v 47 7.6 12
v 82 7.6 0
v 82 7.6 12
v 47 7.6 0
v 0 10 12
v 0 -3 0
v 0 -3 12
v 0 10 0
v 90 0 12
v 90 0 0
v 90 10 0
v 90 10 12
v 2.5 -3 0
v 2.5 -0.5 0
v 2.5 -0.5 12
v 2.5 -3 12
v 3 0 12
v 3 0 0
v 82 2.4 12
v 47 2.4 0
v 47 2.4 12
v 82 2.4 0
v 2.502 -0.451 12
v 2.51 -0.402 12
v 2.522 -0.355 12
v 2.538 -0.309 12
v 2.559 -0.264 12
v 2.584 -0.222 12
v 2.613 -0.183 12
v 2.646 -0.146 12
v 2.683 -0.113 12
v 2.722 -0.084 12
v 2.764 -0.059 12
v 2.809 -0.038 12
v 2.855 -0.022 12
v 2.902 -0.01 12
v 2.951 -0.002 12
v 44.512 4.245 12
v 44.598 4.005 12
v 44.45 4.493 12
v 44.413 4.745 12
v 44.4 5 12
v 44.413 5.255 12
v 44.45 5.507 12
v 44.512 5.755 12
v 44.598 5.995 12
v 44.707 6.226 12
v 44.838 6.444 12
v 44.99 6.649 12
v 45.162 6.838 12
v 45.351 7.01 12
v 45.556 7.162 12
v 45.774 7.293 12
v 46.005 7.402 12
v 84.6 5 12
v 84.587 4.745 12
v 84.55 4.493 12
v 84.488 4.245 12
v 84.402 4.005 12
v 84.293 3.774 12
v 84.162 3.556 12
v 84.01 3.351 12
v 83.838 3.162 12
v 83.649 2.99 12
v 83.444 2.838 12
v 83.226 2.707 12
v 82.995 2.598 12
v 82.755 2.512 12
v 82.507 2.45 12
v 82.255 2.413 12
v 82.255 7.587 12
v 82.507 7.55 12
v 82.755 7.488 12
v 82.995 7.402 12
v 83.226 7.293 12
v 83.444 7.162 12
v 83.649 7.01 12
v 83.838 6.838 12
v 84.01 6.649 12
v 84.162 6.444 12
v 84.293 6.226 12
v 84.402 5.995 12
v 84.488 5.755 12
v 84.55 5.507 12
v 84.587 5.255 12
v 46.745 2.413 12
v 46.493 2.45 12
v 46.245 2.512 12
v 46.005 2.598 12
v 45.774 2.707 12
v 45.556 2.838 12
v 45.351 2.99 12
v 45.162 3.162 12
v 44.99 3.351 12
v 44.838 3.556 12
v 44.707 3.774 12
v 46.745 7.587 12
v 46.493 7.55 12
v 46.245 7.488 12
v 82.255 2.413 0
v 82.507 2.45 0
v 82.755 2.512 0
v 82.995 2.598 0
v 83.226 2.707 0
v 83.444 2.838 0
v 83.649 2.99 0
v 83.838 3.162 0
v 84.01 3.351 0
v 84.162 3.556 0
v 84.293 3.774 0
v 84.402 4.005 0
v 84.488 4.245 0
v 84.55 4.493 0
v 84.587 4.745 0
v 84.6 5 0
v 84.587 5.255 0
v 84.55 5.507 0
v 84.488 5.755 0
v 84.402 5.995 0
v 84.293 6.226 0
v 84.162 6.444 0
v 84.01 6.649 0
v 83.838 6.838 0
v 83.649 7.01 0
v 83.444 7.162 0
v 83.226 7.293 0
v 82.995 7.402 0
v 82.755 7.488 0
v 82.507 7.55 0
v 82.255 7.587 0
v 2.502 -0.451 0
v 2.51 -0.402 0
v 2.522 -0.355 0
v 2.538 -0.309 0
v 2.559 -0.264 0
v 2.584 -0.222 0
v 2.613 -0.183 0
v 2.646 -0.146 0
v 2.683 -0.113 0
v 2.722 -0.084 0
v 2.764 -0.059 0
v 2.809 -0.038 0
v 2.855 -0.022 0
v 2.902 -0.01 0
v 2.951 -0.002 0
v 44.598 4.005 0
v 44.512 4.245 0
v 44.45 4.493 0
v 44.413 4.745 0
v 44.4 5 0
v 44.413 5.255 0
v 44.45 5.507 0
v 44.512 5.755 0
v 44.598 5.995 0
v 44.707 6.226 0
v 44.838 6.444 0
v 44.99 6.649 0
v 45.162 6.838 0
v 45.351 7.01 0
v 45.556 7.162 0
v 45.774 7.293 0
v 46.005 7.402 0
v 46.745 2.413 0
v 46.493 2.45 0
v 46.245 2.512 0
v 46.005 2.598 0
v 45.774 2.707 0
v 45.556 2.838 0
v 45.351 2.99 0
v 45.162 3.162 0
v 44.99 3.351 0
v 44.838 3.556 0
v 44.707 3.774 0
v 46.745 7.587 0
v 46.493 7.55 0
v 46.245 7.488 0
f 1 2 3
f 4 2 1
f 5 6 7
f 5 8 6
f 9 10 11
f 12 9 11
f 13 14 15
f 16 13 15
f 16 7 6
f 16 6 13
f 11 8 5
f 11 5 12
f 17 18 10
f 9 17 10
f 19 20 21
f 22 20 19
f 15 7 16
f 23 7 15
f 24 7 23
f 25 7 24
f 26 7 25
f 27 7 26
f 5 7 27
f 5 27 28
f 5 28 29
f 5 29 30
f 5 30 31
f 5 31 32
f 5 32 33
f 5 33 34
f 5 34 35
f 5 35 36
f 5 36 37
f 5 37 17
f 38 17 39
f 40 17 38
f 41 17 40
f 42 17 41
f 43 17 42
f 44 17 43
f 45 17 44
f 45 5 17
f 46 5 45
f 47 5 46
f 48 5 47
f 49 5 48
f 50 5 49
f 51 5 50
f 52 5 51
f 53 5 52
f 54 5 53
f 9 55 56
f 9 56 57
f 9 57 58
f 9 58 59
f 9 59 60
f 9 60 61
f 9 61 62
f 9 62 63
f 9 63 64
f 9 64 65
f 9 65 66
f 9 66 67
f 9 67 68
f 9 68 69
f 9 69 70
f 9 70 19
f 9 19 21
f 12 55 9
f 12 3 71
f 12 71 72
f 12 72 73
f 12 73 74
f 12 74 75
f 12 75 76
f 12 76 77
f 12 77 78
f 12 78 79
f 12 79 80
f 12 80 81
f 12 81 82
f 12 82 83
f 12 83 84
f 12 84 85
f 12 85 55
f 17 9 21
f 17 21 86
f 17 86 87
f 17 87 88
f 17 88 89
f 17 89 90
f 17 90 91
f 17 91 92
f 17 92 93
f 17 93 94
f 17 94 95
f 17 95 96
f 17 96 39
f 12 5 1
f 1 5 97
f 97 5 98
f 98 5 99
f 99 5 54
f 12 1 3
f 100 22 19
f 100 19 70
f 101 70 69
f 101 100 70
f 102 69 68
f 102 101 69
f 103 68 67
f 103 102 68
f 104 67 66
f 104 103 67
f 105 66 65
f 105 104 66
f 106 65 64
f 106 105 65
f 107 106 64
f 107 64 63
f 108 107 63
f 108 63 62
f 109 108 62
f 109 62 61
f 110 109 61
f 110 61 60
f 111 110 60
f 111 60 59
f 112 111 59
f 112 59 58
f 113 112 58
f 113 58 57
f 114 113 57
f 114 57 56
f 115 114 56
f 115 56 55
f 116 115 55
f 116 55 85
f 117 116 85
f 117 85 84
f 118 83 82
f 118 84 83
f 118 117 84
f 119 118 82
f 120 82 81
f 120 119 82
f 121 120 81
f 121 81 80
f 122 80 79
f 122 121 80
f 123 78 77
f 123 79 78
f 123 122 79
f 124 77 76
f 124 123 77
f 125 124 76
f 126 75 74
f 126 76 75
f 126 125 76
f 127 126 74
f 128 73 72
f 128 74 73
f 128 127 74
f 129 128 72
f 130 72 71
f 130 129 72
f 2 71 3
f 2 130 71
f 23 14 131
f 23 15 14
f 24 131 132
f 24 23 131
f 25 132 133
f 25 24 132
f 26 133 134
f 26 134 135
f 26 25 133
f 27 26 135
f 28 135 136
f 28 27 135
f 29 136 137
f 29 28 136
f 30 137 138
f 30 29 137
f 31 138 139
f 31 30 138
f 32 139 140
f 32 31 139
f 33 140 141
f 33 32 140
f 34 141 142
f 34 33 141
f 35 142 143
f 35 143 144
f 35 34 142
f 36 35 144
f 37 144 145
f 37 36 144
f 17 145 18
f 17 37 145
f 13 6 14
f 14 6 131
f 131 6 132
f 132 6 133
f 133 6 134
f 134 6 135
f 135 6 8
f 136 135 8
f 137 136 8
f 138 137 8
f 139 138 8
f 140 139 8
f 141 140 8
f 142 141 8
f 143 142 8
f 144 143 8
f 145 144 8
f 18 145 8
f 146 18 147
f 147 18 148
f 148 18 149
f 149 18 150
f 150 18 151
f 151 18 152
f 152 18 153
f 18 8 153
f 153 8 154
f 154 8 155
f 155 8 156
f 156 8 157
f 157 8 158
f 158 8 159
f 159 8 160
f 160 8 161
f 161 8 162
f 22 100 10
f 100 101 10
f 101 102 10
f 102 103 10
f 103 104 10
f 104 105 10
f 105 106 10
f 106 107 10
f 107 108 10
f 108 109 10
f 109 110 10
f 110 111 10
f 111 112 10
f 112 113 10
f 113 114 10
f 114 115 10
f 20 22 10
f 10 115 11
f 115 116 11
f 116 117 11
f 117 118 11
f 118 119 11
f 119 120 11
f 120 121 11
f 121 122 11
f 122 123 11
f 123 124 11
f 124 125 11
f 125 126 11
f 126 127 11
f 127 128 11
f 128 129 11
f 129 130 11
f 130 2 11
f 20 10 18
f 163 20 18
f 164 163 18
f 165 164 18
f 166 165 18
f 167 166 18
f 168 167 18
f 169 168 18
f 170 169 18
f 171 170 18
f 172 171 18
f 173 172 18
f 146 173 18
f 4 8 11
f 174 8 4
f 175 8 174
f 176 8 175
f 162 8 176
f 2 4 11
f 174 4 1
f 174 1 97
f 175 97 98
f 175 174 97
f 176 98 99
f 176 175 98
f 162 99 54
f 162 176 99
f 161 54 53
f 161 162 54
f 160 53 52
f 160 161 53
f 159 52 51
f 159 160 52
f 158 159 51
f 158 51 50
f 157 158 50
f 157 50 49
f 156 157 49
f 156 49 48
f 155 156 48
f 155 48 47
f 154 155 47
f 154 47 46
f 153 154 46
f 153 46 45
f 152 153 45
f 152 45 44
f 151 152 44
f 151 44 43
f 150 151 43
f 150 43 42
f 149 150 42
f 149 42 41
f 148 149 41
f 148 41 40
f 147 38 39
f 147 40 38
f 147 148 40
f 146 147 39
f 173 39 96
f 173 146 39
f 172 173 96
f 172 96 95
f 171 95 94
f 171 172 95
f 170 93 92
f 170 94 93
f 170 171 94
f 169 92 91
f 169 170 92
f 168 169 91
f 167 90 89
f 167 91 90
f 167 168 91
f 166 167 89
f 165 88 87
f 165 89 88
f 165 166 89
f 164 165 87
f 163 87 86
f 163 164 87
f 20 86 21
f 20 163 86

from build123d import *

# Parameters (mm, degrees)
SKETCH_1_W          = 90
SKETCH_1_H          = 10
EXTRUDE_1_DEPTH     = 12
SKETCH_2_W          = 2.5
SKETCH_2_H          = 12
EXTRUDE_2_DEPTH     = 3
CUT_EXTRUDE_1_DEPTH = 92.345497973
FILLET_1_R          = 0.5


with BuildPart() as part:
    # 草图1 → 凸台-拉伸1 (new body)
    with BuildSketch(Plane.XY):
        with Locations((45, 5)):
            Rectangle(SKETCH_1_W, SKETCH_1_H)
    extrude(amount=EXTRUDE_1_DEPTH)

    # 草图2 → 凸台-拉伸2 (add)
    with BuildSketch(Plane.XZ):
        with Locations((1.25, 6)):
            Rectangle(SKETCH_2_W, SKETCH_2_H)
    extrude(amount=EXTRUDE_2_DEPTH)

    # 草图3 → 切除-拉伸1 (cut, through all)
    with BuildSketch(Plane(origin=(0, 0, 0), x_dir=(-1, 0, 0), z_dir=(0, 0, -1))):
        with BuildLine():
            Line((-82, 7.6), (-47, 7.6))
            ThreePointArc((-47, 7.6), (-44.4, 5), (-47, 2.4))
            Line((-47, 2.4), (-82, 2.4))
            ThreePointArc((-82, 2.4), (-84.6, 5), (-82, 7.6))
        make_face()
    extrude(amount=-CUT_EXTRUDE_1_DEPTH, mode=Mode.SUBTRACT)

    # 圆角1
    fillet_1_edges = [part.edges().sort_by_distance(p)[0] for p in [
        (2.5, 0, 6),
    ]]
    fillet(fillet_1_edges, radius=FILLET_1_R)


solid = part.part
